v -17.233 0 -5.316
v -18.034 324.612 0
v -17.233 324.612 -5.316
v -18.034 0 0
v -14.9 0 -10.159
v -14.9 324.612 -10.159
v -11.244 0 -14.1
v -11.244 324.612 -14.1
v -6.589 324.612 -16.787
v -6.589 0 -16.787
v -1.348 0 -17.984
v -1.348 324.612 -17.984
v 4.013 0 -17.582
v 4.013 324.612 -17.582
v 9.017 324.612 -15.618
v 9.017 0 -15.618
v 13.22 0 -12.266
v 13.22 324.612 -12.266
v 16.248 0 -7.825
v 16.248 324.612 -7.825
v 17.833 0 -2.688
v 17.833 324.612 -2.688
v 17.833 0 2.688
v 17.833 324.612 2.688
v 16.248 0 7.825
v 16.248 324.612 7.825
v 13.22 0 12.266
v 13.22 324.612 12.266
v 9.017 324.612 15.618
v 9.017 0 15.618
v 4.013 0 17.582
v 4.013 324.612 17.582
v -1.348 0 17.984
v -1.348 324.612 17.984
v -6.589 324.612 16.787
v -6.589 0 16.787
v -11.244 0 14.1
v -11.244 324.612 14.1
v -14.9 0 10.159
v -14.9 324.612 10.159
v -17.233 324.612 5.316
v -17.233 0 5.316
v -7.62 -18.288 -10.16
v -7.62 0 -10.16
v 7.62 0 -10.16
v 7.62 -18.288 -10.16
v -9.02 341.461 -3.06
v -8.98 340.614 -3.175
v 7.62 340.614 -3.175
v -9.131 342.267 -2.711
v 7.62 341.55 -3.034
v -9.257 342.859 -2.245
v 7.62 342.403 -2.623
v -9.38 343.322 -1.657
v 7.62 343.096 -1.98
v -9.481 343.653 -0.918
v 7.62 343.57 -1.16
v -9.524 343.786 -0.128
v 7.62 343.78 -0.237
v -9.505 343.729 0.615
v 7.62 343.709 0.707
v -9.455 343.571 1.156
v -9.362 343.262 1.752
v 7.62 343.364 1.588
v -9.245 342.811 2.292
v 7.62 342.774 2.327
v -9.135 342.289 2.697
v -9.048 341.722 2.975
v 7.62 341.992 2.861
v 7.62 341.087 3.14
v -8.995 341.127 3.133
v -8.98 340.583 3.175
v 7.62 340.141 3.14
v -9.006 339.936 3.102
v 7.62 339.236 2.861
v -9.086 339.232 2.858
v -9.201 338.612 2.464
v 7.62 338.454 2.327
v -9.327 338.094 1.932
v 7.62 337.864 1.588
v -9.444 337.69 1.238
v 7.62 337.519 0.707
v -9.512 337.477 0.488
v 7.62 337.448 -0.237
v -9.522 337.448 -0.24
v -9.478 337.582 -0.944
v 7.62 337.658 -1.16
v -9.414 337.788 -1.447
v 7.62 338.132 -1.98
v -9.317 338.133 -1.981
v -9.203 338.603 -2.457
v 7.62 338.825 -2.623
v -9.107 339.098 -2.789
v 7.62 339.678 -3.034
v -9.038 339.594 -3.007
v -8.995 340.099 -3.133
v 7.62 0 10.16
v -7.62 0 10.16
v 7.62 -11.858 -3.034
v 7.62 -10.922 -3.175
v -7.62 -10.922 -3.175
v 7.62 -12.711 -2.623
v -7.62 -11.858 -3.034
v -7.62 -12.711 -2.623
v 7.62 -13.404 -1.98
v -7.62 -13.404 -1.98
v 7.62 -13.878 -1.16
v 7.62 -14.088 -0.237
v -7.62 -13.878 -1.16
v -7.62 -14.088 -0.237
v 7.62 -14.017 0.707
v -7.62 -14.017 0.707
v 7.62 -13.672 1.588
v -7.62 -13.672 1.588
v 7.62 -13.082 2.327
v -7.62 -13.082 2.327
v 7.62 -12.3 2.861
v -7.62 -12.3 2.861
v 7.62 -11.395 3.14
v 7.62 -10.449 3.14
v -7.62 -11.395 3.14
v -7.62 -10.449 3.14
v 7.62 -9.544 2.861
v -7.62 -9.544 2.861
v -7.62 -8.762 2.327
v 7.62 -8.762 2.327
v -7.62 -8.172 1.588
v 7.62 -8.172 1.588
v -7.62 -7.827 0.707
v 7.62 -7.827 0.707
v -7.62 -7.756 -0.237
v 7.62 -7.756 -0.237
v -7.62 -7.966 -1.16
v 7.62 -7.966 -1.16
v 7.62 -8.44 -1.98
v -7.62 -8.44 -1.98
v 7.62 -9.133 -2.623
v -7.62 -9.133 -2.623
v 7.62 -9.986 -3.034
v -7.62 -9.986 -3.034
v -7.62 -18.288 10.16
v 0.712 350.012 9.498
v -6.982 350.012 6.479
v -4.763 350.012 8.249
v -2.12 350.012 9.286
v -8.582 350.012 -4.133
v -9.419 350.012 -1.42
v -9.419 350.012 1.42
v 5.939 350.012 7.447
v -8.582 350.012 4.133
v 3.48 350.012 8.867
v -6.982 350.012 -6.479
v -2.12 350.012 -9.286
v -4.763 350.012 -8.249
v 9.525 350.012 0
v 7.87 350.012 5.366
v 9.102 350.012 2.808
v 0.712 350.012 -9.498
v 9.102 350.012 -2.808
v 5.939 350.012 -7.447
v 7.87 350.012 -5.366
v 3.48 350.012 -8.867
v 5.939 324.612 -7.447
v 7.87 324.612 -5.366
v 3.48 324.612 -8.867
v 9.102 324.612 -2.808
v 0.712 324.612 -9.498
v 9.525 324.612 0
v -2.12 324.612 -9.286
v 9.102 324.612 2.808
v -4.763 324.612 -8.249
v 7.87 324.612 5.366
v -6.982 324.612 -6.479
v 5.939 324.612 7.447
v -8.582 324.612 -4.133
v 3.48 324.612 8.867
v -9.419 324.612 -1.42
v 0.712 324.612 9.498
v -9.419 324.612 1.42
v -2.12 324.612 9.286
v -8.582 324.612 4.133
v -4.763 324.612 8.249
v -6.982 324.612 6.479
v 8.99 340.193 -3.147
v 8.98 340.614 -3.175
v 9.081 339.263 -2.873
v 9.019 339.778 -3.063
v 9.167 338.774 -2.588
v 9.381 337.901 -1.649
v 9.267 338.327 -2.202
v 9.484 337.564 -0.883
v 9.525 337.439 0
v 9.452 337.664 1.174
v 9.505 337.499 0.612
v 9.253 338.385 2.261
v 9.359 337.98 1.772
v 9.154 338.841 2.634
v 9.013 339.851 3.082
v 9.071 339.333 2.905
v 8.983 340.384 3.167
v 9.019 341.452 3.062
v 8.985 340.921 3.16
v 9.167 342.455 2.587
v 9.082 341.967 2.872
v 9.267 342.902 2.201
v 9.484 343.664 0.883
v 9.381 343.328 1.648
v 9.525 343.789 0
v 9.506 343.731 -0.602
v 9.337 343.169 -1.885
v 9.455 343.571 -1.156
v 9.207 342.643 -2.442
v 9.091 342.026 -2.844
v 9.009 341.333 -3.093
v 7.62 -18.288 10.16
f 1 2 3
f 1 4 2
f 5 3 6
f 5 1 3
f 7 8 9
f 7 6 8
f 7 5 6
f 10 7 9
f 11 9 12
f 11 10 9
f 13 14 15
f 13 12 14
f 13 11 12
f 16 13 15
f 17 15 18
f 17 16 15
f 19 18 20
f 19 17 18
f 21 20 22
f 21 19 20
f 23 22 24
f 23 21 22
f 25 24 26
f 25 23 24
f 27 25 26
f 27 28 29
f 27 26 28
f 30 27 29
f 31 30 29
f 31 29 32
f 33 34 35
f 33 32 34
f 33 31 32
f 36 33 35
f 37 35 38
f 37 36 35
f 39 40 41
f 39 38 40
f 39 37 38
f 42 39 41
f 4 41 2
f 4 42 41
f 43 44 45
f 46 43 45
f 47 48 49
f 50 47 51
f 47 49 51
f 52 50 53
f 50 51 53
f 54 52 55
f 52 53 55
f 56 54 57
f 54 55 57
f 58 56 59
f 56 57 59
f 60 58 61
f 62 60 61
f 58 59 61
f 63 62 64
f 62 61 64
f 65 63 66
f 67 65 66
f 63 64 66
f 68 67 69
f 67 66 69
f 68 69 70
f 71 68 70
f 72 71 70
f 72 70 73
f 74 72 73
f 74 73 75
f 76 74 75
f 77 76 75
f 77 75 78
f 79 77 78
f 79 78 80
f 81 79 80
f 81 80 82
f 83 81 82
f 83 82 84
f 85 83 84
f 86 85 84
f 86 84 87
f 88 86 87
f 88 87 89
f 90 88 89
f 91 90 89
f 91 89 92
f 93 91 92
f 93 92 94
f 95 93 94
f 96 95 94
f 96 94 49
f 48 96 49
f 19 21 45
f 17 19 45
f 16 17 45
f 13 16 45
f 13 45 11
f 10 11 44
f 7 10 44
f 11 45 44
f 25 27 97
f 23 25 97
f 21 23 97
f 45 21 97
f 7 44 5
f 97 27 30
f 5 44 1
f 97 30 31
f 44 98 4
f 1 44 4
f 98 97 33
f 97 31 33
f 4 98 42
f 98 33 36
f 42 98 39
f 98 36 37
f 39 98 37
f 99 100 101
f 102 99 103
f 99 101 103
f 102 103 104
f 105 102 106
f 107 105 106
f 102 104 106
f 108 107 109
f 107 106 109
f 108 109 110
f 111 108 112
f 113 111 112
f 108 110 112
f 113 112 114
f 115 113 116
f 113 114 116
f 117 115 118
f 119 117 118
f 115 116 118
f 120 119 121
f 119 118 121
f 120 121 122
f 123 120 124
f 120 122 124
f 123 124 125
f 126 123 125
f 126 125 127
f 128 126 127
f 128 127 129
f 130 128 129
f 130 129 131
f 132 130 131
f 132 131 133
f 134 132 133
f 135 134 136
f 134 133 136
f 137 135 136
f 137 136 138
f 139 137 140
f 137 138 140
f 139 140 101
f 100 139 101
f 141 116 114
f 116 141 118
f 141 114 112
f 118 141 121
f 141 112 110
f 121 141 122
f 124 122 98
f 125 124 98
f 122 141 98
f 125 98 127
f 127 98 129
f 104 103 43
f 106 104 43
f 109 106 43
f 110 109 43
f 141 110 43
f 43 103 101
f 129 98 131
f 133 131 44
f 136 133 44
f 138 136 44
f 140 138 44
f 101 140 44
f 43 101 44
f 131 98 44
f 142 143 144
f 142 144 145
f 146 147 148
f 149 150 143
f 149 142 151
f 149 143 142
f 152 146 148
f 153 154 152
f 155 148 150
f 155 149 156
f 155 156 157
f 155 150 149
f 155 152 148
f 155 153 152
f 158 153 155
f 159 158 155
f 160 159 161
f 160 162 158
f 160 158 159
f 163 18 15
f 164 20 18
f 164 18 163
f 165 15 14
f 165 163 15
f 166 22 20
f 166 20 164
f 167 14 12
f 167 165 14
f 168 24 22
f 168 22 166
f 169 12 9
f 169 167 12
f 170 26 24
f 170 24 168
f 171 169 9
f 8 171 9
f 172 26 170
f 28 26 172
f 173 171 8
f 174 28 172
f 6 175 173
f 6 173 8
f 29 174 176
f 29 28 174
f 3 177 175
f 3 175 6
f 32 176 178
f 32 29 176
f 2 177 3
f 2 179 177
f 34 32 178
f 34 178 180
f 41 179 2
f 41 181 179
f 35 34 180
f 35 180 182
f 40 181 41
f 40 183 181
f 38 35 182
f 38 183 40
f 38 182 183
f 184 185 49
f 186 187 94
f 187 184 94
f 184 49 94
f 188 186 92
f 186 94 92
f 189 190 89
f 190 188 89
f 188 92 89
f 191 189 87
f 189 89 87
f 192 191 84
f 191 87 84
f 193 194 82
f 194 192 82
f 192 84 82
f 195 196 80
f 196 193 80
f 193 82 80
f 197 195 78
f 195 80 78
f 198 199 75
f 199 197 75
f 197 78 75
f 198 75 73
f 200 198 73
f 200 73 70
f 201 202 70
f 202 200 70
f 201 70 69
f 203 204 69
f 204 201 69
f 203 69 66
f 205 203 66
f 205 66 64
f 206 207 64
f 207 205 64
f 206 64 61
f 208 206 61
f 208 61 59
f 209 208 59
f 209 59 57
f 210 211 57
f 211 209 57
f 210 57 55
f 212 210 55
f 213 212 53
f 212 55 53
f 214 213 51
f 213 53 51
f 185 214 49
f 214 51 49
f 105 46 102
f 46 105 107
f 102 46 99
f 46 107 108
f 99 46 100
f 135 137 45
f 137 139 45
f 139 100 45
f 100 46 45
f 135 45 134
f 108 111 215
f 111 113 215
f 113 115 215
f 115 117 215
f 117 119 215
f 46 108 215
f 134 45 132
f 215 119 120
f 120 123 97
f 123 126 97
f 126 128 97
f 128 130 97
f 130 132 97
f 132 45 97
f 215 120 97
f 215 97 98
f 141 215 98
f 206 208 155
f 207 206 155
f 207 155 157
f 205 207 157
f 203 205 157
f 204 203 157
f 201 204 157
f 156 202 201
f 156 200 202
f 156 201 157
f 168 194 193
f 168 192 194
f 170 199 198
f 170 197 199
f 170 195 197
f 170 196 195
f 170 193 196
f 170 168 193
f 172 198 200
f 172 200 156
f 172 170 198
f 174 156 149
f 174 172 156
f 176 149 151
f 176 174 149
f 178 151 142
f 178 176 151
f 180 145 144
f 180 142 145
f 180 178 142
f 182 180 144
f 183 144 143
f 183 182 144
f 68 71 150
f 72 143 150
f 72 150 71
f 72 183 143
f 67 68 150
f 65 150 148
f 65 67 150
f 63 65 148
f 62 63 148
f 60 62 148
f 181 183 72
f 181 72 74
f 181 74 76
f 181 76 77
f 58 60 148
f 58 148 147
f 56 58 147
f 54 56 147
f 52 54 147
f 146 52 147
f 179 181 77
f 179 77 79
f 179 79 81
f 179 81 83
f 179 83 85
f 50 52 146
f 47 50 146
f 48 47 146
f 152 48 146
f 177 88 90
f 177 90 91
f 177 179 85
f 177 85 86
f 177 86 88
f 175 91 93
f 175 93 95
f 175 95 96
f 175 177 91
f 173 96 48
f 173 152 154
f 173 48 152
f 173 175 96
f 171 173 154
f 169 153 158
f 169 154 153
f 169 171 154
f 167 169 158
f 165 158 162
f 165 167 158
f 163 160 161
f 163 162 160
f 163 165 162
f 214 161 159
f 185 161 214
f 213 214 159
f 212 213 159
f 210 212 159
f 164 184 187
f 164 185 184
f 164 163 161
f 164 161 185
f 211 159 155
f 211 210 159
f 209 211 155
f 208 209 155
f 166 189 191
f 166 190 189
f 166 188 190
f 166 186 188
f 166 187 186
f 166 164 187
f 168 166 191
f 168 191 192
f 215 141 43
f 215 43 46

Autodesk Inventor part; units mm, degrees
ref_plane "YZ Plane" through (0, 0, 0) normal (1, 0, 0) x (0, 1, 0)
ref_plane "XZ Plane" through (0, 0, 0) normal (0, 1, 0) x (-1, 0, 0)
ref_plane "XY Plane" through (0, 0, 0) normal (0, 0, 1) x (1, 0, 0)
sketch "Sketch1" plane through (0, 0, 0) normal (0, 1, 0) x (-1, 0, 0)
  circle A0 centre (0, 0) radius 18.034
  dimension "d0" = 36.068
extrude "Extrusion1" add sketch "Sketch1" along normal blind 324.612
sketch "Sketch2" plane through (0, 324.612, 0) normal (0, 1, 0) x (1, 0, 0)
  circle A0 centre (0, 0) radius 9.525
  dimension "d3" = 19.05
extrude "Extrusion2" add sketch "Sketch2" along normal blind 25.4
sketch "Sketch3" plane through (0, 0, 0) normal (0, -1, 0) x (1, 0, 0)
  line L0 (-7.62, -10.16) -> (7.62, -10.16)
  line L1 (7.62, -10.16) -> (7.62, 10.16)
  line L2 (7.62, 10.16) -> (-7.62, 10.16)
  line L3 (-7.62, 10.16) -> (-7.62, -10.16)
  line L4 (-7.62, -10.16) -> (7.62, 10.16) construction
  line L5 (7.62, -10.16) -> (-7.62, 10.16) construction
  point P0 (0, 0)
  dimension "d6" = 15.24
  dimension "d7" = 20.32
extrude "Extrusion3" add sketch "Sketch3" along normal blind 18.288
sketch "Sketch4" plane through (7.62, 0, 10.16) normal (1, 0, 0) x (0, 0, -1)
  line L0 (0, 0) -> (20.32, 0) projected
  line L1 (20.32, 0) -> (20.32, -18.288) projected
  point P0 (10.16, 0)
  point P1 (10.16, -10.922)
  dimension "d10" = 10.922
  dimension "d11" = 10.16
hole "Hole1" at (7.62, -10.922, 0) direction (-1, 0, 0) diameter 6.35 end through all
sketch "Sketch5" plane through (7.62, 0, 10.16) normal (1, 0, 0) x (0, 0, -1)
  circle A0 centre (10.16, 340.614) radius 3.175
  line L0 (19.685, 350.012) -> (0.635, 350.012) projected
  point P0 (10.16, 0)
  dimension "d19" = 6.35
  dimension "d24" = 9.398
extrude "Extrusion4" cut sketch "Sketch5" along normal mid plane 127
properties part number "9 inch Linear Actuator"
